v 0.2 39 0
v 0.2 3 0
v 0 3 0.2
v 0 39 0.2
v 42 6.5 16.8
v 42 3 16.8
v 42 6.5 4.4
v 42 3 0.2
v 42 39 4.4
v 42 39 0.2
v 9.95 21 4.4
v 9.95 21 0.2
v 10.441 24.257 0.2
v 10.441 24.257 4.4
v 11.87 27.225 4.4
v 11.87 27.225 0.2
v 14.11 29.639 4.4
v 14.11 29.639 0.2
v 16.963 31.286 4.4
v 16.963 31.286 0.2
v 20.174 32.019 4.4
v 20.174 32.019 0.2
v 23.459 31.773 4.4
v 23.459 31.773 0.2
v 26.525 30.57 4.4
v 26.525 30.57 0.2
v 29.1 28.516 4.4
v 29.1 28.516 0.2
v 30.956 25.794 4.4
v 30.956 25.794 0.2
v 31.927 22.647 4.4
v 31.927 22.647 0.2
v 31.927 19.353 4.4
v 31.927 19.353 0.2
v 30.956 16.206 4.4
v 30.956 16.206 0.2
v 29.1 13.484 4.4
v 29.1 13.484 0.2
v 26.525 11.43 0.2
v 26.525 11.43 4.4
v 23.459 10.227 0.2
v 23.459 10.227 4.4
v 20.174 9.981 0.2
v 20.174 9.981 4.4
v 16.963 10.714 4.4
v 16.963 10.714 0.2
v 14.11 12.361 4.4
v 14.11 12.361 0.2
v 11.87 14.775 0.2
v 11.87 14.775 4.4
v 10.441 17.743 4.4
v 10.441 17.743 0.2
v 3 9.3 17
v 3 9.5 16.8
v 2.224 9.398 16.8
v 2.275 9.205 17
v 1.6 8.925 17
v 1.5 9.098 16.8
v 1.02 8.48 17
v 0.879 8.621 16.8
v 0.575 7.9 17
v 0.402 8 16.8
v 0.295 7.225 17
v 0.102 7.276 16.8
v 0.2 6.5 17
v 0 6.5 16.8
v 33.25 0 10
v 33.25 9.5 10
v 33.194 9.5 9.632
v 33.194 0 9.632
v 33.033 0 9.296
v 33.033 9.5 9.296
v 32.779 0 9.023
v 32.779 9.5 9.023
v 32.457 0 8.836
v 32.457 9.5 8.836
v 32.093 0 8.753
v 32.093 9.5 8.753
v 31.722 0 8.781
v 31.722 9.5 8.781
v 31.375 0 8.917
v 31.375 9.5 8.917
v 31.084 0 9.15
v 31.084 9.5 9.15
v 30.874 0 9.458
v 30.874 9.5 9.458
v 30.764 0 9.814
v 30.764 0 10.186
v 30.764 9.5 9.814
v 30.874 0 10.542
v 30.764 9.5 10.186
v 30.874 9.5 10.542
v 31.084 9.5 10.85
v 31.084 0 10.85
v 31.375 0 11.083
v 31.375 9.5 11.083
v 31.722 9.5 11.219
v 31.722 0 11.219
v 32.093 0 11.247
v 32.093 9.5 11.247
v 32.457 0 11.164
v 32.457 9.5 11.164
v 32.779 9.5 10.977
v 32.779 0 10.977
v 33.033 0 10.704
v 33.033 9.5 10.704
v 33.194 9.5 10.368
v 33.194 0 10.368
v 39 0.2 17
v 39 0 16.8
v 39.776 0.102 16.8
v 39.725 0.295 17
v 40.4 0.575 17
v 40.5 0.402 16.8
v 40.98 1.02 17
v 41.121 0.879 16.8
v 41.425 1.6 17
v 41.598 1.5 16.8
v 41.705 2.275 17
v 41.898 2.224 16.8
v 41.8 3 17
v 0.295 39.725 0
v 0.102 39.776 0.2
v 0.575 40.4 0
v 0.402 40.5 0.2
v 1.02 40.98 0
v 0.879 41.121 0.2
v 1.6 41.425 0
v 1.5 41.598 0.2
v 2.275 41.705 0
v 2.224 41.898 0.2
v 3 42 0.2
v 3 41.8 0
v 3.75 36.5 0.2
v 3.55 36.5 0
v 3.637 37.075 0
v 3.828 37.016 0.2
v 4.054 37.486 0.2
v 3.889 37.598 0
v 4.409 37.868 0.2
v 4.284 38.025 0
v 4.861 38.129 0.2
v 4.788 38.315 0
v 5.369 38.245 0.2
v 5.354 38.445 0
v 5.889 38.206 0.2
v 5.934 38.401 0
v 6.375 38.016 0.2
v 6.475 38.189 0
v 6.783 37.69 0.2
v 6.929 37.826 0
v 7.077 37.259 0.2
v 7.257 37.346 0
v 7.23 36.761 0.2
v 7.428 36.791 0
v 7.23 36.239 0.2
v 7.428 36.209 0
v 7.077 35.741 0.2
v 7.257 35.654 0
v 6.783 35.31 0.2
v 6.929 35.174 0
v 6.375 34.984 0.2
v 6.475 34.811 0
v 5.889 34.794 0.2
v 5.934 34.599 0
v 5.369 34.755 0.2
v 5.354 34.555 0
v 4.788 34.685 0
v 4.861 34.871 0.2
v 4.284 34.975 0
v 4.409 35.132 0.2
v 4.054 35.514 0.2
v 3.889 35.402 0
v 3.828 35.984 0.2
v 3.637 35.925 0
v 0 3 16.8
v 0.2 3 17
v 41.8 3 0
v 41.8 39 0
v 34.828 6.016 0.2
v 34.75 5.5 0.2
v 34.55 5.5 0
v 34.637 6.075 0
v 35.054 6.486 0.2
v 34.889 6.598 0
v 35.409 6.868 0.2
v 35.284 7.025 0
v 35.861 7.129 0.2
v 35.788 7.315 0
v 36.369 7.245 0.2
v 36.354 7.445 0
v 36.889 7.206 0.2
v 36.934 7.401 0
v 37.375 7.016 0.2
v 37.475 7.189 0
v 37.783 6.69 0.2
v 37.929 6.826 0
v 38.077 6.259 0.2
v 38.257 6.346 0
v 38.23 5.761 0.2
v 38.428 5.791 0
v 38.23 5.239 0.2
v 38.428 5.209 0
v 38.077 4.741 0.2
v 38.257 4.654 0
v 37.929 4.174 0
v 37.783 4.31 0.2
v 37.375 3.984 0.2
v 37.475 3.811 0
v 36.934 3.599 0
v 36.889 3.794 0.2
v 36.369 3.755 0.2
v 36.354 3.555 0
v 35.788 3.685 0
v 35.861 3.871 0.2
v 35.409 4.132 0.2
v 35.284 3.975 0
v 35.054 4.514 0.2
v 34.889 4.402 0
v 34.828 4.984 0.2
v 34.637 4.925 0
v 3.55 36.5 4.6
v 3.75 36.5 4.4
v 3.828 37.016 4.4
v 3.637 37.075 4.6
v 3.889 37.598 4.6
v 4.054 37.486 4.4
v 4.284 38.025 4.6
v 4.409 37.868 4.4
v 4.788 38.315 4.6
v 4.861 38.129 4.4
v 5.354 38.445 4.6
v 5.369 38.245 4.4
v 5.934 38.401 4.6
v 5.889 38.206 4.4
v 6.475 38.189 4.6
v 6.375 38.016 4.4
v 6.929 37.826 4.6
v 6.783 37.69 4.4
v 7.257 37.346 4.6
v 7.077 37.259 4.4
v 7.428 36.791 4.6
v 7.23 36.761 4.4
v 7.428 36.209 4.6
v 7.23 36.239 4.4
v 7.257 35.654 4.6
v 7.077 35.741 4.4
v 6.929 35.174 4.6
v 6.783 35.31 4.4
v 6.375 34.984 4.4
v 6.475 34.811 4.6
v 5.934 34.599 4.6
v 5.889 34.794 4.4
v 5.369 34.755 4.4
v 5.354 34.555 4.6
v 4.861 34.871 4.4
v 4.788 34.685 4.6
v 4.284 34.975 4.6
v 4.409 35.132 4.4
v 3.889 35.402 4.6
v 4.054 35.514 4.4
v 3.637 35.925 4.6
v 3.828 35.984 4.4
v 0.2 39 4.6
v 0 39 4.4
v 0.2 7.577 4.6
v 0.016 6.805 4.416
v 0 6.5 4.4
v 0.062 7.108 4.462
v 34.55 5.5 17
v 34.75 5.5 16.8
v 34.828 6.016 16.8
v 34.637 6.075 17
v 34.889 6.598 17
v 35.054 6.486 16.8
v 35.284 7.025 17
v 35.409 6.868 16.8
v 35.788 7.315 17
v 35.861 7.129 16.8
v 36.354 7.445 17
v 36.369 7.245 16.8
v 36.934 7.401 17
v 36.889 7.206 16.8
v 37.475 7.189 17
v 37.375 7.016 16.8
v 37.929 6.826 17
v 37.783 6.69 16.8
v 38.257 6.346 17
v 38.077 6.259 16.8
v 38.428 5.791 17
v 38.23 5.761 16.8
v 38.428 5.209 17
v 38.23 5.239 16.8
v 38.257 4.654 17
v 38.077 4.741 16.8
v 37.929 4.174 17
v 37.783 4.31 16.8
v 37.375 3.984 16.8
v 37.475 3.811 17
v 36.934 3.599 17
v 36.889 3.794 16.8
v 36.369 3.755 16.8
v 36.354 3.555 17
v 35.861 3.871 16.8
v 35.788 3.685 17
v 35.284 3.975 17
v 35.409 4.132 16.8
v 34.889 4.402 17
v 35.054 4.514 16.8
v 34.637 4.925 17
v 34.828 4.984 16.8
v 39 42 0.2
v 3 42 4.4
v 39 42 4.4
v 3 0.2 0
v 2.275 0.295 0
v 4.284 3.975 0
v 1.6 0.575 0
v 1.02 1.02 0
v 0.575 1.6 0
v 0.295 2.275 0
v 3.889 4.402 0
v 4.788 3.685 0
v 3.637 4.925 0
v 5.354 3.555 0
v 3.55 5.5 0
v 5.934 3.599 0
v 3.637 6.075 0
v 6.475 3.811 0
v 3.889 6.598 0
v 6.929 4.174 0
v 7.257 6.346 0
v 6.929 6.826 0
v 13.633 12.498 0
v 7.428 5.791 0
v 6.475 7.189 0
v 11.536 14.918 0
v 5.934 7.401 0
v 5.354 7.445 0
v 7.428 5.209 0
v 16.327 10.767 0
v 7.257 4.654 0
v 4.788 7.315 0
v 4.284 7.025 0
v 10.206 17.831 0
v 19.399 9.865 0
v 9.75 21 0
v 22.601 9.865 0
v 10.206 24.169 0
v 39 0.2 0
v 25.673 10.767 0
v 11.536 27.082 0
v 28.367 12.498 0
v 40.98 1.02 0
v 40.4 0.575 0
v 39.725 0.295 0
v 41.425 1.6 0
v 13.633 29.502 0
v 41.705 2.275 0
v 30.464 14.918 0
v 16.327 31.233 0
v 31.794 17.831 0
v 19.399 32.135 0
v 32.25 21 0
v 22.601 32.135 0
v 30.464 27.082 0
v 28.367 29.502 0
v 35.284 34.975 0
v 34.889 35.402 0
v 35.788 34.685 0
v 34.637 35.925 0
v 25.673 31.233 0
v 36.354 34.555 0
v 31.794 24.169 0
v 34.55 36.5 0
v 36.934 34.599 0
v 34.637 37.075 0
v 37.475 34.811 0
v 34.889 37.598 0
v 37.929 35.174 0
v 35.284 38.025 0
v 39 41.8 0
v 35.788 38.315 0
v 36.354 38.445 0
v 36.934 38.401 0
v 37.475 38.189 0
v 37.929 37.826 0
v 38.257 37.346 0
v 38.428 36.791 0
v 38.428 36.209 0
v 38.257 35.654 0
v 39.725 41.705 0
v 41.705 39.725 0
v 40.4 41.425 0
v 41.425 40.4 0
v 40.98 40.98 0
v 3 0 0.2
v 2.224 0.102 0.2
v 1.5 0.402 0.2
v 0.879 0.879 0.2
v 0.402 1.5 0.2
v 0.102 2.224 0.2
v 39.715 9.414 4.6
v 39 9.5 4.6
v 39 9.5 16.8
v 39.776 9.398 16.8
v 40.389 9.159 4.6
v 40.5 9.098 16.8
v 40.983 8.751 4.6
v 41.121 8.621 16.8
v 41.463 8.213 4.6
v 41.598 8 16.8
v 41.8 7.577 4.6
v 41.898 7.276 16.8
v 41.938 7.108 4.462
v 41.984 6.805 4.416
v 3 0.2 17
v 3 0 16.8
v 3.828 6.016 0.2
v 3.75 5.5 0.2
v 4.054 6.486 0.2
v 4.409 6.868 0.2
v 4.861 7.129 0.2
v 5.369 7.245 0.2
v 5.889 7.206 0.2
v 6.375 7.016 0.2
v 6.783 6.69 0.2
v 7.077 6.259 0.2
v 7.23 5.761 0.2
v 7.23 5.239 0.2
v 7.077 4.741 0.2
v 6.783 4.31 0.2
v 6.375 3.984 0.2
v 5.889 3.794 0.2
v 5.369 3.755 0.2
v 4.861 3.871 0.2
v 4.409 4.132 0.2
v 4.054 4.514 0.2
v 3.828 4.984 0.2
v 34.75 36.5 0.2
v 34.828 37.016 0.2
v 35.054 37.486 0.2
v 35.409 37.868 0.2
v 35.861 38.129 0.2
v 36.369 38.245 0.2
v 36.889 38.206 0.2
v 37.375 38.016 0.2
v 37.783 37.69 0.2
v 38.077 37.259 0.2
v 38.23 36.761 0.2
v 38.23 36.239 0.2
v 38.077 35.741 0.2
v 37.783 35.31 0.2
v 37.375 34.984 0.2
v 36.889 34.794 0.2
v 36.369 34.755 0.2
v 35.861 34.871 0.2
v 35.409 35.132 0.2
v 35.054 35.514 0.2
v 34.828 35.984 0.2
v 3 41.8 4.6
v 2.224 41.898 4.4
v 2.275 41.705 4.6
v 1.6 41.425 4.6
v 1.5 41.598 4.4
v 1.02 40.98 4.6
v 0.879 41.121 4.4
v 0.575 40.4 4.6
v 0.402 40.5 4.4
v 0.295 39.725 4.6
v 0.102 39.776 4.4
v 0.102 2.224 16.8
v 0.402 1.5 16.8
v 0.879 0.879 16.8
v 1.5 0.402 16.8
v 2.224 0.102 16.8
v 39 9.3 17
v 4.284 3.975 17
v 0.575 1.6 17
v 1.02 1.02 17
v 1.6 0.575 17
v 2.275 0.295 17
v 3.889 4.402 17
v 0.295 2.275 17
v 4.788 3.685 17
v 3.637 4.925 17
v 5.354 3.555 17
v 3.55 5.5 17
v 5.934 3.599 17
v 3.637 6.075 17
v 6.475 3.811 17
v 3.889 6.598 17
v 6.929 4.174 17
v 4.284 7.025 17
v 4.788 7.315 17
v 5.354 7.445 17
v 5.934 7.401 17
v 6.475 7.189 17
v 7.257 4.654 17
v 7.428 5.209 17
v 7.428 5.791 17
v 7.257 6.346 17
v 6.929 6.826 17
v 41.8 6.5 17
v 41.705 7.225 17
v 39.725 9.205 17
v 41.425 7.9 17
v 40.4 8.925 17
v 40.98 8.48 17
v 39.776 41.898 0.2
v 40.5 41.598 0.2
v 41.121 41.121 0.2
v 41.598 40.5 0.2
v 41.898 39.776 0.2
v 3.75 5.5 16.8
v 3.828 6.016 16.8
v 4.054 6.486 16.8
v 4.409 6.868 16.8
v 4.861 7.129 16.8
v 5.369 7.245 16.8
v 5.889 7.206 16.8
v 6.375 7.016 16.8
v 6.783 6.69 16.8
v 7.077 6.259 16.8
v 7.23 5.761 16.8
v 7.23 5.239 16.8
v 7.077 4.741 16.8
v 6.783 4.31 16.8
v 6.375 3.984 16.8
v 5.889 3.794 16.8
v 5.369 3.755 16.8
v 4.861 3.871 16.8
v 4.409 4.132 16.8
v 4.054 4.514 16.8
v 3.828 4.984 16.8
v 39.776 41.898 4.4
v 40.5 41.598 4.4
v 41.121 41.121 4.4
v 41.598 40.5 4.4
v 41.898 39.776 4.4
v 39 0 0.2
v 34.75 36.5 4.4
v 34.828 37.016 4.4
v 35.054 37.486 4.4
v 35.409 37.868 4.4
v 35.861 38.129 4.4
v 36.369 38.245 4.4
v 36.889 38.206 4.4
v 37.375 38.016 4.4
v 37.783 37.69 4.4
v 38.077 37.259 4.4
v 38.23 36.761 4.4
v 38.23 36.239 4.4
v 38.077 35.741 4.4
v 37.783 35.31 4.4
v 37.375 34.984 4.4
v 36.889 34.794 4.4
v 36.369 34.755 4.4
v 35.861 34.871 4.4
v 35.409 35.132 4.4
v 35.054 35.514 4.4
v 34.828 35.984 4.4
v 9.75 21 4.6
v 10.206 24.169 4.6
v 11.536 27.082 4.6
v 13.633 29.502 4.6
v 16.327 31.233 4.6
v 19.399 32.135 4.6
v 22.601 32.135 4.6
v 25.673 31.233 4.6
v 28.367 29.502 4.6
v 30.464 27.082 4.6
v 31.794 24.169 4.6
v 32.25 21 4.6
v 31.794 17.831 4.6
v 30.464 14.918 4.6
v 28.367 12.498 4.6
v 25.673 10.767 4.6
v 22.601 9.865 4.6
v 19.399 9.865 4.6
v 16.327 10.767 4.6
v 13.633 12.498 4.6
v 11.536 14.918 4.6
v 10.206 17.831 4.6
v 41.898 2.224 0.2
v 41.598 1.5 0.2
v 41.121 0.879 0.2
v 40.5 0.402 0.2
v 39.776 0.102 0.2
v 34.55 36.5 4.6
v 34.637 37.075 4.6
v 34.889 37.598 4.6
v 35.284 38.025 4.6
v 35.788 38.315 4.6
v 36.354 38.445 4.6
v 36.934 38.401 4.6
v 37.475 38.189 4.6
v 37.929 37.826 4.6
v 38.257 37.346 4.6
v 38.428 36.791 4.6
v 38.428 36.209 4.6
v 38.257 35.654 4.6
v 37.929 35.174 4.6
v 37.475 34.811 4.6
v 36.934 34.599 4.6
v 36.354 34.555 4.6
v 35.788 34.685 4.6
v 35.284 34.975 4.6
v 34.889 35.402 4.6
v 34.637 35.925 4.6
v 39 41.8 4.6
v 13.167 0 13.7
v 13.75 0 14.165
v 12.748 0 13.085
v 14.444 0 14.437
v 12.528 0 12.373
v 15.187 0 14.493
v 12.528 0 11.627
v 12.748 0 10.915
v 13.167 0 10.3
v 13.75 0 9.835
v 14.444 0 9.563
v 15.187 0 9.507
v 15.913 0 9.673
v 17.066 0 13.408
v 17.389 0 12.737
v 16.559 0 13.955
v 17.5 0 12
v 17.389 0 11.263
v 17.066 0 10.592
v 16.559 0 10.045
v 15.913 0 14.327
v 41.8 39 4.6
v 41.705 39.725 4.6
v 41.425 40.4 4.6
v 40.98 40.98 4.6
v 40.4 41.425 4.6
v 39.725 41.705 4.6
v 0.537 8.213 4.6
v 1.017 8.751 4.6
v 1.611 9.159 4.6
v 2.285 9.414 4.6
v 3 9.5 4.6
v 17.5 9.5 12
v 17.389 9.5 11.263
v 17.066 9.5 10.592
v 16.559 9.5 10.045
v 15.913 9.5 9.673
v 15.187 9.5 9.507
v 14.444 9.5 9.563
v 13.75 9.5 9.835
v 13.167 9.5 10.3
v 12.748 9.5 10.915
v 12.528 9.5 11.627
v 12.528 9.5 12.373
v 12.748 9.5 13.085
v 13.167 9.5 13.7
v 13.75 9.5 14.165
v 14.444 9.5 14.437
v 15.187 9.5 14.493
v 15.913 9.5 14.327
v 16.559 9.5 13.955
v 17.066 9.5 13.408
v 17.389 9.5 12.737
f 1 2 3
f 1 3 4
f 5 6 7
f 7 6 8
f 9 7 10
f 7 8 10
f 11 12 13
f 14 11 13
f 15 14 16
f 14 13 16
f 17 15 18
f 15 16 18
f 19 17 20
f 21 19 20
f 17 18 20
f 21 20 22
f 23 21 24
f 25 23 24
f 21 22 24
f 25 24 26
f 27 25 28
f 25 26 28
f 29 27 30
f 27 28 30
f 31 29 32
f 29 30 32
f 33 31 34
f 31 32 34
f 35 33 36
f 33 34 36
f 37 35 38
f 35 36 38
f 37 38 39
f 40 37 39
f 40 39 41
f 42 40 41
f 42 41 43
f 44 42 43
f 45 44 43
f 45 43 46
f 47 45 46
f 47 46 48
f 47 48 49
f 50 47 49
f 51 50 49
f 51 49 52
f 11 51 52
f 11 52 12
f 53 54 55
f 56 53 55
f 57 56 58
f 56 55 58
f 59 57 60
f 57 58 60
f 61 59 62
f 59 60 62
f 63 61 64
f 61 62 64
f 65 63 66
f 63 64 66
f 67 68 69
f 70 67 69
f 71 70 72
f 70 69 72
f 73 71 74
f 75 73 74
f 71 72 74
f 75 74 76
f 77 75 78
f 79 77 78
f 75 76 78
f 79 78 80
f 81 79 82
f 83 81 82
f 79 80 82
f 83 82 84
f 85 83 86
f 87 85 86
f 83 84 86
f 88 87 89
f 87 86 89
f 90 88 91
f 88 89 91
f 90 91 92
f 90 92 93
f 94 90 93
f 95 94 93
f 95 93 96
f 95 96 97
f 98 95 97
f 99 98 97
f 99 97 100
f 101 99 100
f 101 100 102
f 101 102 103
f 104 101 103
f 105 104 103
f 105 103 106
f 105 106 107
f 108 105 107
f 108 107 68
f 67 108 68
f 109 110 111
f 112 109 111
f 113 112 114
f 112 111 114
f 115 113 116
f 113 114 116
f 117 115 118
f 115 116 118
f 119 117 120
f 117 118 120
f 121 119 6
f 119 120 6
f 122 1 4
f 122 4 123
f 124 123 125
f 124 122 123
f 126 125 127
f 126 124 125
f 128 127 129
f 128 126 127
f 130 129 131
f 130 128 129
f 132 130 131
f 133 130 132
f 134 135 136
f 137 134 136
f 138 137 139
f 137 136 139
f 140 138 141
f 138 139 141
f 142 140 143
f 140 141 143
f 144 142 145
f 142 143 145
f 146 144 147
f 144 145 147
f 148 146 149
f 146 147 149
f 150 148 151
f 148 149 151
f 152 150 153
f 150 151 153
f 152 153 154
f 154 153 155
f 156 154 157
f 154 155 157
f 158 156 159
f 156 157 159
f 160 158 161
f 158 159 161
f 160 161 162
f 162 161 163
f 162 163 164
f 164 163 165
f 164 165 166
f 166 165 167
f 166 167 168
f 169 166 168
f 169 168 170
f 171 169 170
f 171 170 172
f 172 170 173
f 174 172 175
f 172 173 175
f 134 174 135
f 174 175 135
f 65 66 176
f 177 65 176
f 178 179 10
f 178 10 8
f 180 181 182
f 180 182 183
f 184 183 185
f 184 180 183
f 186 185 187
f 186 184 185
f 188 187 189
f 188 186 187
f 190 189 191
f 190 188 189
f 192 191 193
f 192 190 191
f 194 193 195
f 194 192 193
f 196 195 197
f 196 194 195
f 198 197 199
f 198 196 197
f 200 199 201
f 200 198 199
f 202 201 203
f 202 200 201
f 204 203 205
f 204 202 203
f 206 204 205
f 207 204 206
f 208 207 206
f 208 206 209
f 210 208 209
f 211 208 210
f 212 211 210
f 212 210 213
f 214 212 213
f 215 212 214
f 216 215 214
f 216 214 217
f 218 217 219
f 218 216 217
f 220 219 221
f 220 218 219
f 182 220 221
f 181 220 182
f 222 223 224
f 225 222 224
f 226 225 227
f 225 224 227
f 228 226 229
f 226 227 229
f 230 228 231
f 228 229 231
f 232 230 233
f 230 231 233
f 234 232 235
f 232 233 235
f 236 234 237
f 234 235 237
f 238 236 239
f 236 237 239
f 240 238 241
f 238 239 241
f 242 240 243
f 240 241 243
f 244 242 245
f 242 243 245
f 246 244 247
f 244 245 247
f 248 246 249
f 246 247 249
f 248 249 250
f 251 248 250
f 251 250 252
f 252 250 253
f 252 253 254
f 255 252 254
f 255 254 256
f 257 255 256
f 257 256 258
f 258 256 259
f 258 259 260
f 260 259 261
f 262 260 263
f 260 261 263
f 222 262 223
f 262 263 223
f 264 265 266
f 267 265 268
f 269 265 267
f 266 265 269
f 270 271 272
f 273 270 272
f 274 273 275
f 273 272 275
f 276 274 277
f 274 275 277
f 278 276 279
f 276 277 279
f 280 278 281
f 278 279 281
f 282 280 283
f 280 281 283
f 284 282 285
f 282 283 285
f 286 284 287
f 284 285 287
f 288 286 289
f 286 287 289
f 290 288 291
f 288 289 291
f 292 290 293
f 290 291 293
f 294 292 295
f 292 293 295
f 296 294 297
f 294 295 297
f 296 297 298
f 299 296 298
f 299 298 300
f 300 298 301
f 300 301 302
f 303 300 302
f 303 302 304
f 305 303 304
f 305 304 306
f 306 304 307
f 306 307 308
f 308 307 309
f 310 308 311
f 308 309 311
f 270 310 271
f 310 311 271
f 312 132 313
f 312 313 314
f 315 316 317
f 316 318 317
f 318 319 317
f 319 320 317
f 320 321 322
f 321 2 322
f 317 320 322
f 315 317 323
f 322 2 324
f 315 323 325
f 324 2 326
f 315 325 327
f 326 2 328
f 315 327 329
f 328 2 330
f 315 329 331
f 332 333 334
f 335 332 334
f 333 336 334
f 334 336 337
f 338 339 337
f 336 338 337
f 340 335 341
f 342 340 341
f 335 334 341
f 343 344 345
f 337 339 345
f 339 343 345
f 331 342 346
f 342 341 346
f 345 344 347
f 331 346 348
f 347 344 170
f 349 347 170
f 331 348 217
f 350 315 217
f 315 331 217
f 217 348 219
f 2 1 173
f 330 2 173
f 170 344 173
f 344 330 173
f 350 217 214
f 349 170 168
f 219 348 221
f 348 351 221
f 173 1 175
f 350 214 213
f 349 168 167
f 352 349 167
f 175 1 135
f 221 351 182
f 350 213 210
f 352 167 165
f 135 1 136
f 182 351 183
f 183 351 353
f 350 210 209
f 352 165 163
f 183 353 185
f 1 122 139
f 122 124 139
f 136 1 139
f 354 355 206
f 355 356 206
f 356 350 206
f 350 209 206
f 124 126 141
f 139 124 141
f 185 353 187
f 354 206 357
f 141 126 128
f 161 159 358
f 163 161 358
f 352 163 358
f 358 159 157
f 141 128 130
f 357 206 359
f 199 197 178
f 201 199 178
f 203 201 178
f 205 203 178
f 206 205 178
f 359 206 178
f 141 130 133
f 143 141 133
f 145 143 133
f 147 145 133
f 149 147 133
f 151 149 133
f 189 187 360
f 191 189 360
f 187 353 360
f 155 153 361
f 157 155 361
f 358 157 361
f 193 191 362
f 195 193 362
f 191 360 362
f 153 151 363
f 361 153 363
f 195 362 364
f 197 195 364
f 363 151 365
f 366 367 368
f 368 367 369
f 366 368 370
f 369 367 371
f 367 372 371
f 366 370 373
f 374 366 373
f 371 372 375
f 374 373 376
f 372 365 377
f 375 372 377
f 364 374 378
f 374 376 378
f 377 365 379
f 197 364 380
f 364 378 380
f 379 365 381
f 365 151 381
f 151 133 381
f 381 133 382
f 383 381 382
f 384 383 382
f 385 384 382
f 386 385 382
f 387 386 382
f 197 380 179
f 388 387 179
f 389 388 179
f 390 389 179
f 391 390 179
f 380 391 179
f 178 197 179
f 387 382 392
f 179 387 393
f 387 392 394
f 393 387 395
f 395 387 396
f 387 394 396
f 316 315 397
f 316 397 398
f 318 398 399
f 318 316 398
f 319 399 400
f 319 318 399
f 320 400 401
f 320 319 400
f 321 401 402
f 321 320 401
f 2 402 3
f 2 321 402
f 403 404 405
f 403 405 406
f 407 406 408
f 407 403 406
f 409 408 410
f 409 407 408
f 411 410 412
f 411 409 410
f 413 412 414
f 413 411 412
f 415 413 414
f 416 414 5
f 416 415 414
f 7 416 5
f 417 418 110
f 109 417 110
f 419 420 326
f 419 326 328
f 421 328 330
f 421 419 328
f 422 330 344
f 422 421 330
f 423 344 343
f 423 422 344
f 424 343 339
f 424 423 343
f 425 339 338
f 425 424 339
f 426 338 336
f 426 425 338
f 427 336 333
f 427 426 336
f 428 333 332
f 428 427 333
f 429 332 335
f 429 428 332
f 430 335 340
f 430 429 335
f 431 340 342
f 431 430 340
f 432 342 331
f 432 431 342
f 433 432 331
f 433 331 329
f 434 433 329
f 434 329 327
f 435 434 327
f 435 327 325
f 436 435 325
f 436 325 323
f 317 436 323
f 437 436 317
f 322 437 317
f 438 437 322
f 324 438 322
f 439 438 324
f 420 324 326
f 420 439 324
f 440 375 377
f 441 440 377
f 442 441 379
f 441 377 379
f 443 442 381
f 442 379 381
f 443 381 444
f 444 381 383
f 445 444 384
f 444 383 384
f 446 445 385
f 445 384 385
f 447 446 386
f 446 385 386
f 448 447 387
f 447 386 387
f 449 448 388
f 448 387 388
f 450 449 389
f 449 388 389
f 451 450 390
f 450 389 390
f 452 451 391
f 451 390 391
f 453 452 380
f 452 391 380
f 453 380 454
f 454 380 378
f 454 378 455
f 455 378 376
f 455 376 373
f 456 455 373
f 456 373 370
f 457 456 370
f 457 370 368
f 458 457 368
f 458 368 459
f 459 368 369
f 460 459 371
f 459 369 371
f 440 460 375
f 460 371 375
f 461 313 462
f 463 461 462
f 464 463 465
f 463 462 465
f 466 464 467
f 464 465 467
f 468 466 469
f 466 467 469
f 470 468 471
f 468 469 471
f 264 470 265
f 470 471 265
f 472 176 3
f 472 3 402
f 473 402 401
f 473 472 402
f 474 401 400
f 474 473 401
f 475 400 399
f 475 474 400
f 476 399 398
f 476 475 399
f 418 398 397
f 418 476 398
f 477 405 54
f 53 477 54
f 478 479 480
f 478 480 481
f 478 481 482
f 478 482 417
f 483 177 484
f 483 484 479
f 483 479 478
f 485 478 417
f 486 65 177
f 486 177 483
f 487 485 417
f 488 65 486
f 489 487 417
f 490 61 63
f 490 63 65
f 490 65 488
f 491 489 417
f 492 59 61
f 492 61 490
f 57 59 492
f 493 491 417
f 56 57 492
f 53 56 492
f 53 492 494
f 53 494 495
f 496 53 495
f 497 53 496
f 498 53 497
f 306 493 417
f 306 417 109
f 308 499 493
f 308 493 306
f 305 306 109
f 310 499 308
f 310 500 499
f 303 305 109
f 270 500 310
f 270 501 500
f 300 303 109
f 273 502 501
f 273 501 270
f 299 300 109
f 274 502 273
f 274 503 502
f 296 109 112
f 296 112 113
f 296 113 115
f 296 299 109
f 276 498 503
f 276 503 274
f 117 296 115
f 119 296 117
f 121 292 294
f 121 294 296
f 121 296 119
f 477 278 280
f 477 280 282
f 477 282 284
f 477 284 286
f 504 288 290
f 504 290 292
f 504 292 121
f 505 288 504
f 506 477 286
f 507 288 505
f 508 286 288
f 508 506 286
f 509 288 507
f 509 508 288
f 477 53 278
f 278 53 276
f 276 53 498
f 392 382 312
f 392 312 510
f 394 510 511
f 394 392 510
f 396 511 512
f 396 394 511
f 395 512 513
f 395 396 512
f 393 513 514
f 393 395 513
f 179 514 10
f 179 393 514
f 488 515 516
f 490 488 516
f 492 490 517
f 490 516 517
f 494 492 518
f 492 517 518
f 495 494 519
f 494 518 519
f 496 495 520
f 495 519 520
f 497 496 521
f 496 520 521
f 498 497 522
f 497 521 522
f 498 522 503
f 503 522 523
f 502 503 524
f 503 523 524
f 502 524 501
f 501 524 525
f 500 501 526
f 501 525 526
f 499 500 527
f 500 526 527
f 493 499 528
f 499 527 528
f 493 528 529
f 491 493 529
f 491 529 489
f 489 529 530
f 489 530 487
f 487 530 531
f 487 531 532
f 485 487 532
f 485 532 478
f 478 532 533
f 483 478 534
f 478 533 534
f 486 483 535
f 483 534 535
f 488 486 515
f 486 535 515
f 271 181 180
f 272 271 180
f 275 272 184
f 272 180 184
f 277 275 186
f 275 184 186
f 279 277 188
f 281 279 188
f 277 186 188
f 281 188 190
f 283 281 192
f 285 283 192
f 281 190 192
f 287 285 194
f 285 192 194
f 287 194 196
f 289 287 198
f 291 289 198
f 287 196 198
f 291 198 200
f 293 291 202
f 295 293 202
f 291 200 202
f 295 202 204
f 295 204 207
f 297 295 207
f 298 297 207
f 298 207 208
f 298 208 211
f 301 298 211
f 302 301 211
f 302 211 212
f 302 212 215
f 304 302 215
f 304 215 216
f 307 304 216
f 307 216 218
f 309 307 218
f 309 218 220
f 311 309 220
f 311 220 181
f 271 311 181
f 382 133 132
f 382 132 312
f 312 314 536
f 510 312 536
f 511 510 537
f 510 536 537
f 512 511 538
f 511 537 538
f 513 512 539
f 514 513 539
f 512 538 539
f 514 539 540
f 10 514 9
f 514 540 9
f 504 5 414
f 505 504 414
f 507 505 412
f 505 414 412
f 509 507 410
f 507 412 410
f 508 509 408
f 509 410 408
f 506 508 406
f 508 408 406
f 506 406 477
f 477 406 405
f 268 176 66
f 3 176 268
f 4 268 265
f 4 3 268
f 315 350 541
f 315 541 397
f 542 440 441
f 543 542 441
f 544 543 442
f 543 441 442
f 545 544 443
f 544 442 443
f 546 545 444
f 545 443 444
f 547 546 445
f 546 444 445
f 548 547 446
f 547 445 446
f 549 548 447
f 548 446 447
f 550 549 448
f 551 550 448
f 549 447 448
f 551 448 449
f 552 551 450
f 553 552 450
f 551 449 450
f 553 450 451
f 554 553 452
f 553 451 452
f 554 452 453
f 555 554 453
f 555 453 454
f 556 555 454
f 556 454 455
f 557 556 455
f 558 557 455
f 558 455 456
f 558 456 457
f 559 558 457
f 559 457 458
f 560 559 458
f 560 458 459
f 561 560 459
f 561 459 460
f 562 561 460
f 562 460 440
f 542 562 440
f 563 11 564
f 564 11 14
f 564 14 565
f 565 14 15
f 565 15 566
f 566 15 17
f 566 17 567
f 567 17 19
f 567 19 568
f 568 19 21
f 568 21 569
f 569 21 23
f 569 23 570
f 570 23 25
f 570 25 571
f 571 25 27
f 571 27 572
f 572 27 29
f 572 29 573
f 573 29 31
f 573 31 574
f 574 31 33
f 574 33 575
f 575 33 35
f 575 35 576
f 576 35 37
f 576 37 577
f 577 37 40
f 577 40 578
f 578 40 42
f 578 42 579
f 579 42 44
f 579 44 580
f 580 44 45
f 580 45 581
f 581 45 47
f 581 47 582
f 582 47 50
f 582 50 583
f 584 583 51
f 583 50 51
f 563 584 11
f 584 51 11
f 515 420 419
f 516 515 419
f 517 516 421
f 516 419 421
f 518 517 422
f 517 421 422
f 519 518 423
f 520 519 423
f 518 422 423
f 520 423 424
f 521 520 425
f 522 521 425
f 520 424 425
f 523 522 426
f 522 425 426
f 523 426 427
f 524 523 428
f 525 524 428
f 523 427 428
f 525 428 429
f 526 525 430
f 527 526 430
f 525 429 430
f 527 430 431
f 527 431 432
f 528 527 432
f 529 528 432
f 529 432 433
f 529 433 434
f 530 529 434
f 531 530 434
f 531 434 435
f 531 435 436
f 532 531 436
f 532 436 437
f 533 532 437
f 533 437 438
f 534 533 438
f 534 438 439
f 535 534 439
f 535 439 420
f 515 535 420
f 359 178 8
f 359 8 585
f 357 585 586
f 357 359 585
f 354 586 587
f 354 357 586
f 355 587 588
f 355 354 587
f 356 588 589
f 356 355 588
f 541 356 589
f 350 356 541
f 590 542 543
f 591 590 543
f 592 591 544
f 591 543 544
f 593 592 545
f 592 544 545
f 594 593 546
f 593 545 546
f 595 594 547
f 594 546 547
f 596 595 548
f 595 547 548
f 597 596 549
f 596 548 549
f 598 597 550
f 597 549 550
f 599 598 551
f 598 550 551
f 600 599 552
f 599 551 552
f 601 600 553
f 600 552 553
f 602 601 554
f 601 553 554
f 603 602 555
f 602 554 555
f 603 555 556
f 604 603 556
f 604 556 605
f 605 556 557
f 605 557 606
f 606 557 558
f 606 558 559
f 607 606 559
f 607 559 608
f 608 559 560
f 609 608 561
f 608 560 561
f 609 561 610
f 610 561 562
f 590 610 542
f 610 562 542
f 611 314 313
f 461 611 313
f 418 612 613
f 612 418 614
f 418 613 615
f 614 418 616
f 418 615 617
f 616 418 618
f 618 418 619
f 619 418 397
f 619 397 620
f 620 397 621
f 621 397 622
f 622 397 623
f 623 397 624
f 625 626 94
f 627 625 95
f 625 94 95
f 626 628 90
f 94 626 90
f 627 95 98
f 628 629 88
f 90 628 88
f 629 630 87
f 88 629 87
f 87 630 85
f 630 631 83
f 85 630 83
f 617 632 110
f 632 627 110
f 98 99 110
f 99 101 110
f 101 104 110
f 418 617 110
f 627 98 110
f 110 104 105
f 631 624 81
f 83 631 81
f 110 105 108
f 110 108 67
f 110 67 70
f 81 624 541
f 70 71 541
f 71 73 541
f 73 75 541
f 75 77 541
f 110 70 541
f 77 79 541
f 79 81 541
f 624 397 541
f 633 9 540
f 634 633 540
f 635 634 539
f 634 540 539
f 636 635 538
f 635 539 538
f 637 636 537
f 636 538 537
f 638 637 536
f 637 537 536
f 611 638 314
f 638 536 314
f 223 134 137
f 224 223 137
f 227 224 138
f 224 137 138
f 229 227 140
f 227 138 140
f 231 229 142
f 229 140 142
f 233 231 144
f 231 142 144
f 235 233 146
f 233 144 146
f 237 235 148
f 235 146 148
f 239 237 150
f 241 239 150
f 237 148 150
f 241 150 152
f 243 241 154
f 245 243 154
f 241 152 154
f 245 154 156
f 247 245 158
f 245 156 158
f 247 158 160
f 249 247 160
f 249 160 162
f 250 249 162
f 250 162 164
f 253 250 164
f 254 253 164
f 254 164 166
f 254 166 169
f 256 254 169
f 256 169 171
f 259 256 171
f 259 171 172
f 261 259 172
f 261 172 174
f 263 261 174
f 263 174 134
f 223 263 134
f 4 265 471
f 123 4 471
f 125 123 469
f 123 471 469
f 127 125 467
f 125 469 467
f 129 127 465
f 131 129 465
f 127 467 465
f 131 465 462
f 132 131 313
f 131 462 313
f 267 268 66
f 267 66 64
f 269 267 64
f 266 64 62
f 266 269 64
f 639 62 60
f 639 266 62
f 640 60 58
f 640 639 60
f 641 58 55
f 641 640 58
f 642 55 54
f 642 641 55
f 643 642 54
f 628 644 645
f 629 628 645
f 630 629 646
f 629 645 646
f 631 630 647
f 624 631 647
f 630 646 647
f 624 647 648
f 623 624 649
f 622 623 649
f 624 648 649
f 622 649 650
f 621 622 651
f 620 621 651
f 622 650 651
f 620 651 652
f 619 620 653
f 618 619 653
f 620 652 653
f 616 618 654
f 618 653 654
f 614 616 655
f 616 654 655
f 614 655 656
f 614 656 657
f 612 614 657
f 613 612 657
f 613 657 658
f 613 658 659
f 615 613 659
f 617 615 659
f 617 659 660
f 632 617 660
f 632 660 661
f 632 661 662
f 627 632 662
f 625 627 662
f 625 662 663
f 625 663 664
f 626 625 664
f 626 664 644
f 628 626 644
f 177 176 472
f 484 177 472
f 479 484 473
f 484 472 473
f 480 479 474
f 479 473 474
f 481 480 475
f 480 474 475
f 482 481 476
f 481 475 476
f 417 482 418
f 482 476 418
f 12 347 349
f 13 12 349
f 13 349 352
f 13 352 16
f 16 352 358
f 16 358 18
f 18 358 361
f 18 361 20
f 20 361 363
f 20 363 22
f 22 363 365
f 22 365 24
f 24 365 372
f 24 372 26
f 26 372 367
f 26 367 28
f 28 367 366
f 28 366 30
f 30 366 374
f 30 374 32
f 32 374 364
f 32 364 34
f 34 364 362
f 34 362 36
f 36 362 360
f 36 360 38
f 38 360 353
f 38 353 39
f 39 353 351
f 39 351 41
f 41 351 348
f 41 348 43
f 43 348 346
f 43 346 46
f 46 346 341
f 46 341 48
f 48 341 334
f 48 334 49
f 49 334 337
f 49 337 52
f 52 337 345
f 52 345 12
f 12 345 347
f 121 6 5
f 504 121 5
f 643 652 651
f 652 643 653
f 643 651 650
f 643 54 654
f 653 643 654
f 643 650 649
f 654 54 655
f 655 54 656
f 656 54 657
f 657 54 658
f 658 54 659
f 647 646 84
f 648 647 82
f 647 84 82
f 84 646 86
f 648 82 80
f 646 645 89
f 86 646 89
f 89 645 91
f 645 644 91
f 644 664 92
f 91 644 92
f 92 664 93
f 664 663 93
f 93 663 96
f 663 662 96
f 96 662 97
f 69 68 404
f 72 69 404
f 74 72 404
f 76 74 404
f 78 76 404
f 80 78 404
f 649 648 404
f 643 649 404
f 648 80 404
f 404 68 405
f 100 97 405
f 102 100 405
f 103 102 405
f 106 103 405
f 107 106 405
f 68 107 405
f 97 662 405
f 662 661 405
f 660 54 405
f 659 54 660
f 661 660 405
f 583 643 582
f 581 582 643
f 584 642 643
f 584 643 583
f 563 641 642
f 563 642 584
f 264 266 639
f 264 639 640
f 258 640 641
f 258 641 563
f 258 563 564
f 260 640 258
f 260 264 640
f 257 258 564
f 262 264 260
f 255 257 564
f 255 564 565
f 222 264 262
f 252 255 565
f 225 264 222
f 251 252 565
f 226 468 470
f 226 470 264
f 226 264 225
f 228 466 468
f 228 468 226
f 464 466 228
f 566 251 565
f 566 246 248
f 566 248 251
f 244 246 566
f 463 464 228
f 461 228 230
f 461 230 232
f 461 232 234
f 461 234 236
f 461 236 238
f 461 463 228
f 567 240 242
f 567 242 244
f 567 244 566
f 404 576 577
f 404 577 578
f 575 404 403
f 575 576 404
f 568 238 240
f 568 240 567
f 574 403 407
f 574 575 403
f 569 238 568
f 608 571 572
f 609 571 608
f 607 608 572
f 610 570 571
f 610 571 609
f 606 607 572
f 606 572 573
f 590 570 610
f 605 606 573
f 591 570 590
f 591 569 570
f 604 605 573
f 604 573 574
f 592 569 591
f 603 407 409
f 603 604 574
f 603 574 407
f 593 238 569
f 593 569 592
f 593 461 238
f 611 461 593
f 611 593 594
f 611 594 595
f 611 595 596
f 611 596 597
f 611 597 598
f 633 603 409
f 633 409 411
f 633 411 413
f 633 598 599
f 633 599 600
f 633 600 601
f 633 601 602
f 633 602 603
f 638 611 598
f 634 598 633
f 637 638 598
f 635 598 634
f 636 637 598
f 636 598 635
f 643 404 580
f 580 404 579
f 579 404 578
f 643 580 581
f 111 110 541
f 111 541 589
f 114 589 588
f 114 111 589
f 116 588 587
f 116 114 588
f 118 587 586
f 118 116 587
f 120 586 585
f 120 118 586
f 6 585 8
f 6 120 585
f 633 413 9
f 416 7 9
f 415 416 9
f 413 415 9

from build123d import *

# Parameters (mm, degrees)
SKETCH_1_W          = 42
SKETCH_1_H          = 42
EXTRUDE_1_DEPTH     = 17
SKETCH_2_W          = 42
SKETCH_2_H          = 32.5
CUT_EXTRUDE_1_DEPTH = 12.4
SKETCH_3_R          = 11.05
CUT_EXTRUDE_2_DEPTH = 12.4
SKETCH_4_R          = 2.5
CUT_EXTRUDE_3_DEPTH = 12.4
SKETCH_5_R          = 1.25
CUT_EXTRUDE_4_DEPTH = 12.4
FILLET_1_R          = 3
CHAMFER_1_SIZE      = 0.2
CHAMFER_2_SIZE      = 0.2
CHAMFER_3_SIZE      = 0.2
SKETCH_6_R          = 1.75
CUT_EXTRUDE_5_DEPTH = 26
CHAMFER_4_SIZE      = 0.2


with BuildPart() as part:
    # Эскиз1 → Бобышка-Вытянуть1 (new body)
    with BuildSketch(Plane.XY):
        with Locations((21, 21)):
            Rectangle(SKETCH_1_W, SKETCH_1_H)
    extrude(amount=EXTRUDE_1_DEPTH)

    # Эскиз2 → Вырез-Вытянуть1 (cut)
    with BuildSketch(Plane.XY.offset(17)):
        with Locations((21, 25.75)):
            Rectangle(SKETCH_2_W, SKETCH_2_H)
    extrude(amount=-CUT_EXTRUDE_1_DEPTH, mode=Mode.SUBTRACT)

    # Эскиз3 → Вырез-Вытянуть2 (cut)
    with BuildSketch(Plane(origin=(0, 0, 0), x_dir=(-1, 0, 0), z_dir=(0, 0, -1))):
        with Locations((-21, 21)):
            Circle(SKETCH_3_R)
    extrude(amount=-CUT_EXTRUDE_2_DEPTH, mode=Mode.SUBTRACT)

    # Эскиз4 → Вырез-Вытянуть3 (cut)
    with BuildSketch(Plane(origin=(0, 9.5, 0), x_dir=(1, 0, 0), z_dir=(0, 1, 0))):
        with Locations((15, -12)):
            Circle(SKETCH_4_R)
    extrude(amount=-CUT_EXTRUDE_3_DEPTH, mode=Mode.SUBTRACT)

    # Эскиз5 → Вырез-Вытянуть4 (cut)
    with BuildSketch(Plane(origin=(0, 9.5, 0), x_dir=(1, 0, 0), z_dir=(0, 1, 0))):
        with Locations((32, -10)):
            Circle(SKETCH_5_R)
    extrude(amount=-CUT_EXTRUDE_4_DEPTH, mode=Mode.SUBTRACT)

    # Скругление1
    fillet_1_edges = [part.edges().sort_by_distance(p)[0] for p in [
        (0, 42, 2.3),
        (42, 42, 2.3),
        (0, 9.5, 10.8),
        (42, 9.5, 10.8),
        (42, 0, 8.5),
        (0, 0, 8.5),
    ]]
    fillet(fillet_1_edges, radius=FILLET_1_R)

    # Фаска1
    chamfer_1_edges = [part.edges().sort_by_distance(p)[0] for p in [
        (32.05, 21, 0),
        (21, 42, 0),
        (0, 21, 0),
        (42, 21, 0),
        (21, 0, 0),
        (0.878679656, 0.878679656, 0),
        (41.121320344, 0.878679656, 0),
        (0.878679656, 41.121320344, 0),
        (41.121320344, 41.121320344, 0),
    ]]
    chamfer(chamfer_1_edges, length=CHAMFER_1_SIZE)

    # Фаска2
    chamfer_2_edges = [part.edges().sort_by_distance(p)[0] for p in [
        (42, 24.25, 4.6),
        (21, 42, 4.6),
        (42, 4.75, 17),
        (0, 24.25, 4.6),
        (0.878679656, 41.121320344, 4.6),
        (41.121320344, 41.121320344, 4.6),
        (0, 4.75, 17),
        (21, 0, 17),
        (21, 9.5, 17),
        (0.878679656, 8.621320344, 17),
        (0.878679656, 0.878679656, 17),
        (41.121320344, 8.621320344, 17),
        (41.121320344, 0.878679656, 17),
    ]]
    chamfer(chamfer_2_edges, length=CHAMFER_2_SIZE)

    # Фаска3
    chamfer_3_edges = [part.edges().sort_by_distance(p)[0] for p in [
        (32.05, 21, 4.6),
    ]]
    chamfer(chamfer_3_edges, length=CHAMFER_3_SIZE)

    # Эскиз6 → Вырез-Вытянуть5 (cut)
    with BuildSketch(Plane(origin=(0, 0, 0), x_dir=(-1, 0, 0), z_dir=(0, 0, -1))):
        with Locations((-5.5, 36.5)):
            Circle(SKETCH_6_R)
        with Locations((-36.5, 36.5)):
            Circle(SKETCH_6_R)
        with Locations((-5.5, 5.5)):
            Circle(SKETCH_6_R)
        with Locations((-36.5, 5.5)):
            Circle(SKETCH_6_R)
    extrude(amount=-CUT_EXTRUDE_5_DEPTH, mode=Mode.SUBTRACT)

    # Фаска4
    chamfer_4_edges = [part.edges().sort_by_distance(p)[0] for p in [
        (7.25, 36.5, 4.6),
        (7.25, 36.5, 0),
        (38.25, 36.5, 4.6),
        (38.25, 36.5, 0),
        (7.25, 5.5, 17),
        (7.25, 5.5, 0),
        (38.25, 5.5, 17),
        (38.25, 5.5, 0),
    ]]
    chamfer(chamfer_4_edges, length=CHAMFER_4_SIZE)


solid = part.part
